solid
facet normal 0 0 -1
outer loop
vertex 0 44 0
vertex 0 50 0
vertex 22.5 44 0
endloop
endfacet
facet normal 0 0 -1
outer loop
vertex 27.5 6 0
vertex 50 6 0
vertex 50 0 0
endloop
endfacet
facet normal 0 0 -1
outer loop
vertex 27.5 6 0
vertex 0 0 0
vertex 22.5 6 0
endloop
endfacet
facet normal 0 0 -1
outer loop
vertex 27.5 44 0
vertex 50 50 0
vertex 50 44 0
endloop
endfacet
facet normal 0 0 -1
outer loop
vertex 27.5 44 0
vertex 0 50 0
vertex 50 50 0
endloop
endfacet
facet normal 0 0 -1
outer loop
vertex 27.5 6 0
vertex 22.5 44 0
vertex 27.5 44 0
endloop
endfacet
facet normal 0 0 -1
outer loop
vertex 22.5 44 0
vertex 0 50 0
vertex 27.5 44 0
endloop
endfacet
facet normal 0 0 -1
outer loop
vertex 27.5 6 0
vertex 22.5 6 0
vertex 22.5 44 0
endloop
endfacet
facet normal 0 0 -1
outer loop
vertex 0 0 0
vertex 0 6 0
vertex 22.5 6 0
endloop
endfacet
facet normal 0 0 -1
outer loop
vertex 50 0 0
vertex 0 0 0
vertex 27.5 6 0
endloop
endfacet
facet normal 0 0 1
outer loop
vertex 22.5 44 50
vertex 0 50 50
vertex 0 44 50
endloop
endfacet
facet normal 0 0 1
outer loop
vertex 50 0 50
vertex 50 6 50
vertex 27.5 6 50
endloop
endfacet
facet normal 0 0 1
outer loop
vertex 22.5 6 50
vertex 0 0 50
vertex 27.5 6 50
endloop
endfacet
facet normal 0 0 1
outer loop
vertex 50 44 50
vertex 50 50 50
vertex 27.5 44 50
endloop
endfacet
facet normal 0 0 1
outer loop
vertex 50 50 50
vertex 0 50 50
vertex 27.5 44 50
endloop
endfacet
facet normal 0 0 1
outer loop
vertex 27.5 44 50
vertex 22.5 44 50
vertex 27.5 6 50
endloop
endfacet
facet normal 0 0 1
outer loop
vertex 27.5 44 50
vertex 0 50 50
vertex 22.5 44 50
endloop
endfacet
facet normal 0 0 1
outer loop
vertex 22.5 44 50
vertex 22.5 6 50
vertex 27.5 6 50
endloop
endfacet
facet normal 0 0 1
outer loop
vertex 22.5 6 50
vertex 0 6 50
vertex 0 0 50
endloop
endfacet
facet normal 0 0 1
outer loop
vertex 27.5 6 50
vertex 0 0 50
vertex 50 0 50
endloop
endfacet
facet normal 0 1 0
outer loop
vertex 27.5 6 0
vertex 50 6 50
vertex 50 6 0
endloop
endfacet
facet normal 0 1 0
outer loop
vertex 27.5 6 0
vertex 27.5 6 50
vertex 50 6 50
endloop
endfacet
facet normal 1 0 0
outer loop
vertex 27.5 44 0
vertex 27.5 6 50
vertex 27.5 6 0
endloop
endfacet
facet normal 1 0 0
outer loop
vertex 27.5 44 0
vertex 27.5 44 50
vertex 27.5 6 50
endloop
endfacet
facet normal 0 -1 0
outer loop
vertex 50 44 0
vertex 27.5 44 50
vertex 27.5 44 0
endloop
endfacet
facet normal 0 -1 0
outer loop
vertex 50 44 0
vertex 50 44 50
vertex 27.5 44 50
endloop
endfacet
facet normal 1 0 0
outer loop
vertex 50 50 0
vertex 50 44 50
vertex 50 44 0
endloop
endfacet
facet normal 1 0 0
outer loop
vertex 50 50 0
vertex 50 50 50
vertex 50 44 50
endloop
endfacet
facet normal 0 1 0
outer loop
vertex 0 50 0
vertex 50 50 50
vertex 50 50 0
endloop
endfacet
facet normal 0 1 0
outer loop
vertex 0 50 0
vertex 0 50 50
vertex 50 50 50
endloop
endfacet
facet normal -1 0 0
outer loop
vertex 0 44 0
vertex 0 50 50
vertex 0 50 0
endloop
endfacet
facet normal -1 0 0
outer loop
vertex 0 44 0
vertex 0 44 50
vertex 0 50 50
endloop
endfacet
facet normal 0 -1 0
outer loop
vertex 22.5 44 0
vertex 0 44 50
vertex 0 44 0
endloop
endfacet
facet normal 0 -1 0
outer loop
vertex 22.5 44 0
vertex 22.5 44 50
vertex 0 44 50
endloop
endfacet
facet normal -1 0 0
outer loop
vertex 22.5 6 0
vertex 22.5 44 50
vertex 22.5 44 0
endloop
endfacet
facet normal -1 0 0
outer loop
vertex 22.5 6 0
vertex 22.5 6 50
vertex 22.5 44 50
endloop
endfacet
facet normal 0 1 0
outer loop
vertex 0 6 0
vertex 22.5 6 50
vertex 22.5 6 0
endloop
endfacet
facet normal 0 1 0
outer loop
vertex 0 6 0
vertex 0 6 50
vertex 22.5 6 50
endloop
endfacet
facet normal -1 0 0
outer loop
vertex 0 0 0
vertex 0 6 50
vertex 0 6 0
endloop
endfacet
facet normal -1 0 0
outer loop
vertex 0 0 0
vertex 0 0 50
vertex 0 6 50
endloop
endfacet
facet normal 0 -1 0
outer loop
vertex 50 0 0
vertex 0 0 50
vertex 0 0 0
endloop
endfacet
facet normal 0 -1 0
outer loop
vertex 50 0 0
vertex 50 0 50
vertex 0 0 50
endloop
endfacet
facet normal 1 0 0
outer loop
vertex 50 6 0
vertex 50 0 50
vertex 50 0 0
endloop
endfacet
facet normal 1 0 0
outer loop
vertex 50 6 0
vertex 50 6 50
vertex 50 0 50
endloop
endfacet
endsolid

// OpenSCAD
$fn = 32;

// ----------------------------------------------------------------------
// Structural section: ibeam 50 x 50 mm
// ----------------------------------------------------------------------

// --- parameters (mm) ---
sec_w = 50;               // section width, X
sec_h = 50;               // section height, Y
flange_t = 6;             // flange thickness
web_t = 5;                // web thickness
plate_t = 50;             // cut length, Z (extrusion height)

profile = [[0, 0], [50, 0], [50, 6], [27.5, 6], [27.5, 44], [50, 44], [50, 50], [0, 50], [0, 44], [22.5, 44], [22.5, 6], [0, 6]];  // primary outline, 12 points, counter clockwise

// --- the one profile operation ---
linear_extrude(height = plate_t) polygon(points = profile);
